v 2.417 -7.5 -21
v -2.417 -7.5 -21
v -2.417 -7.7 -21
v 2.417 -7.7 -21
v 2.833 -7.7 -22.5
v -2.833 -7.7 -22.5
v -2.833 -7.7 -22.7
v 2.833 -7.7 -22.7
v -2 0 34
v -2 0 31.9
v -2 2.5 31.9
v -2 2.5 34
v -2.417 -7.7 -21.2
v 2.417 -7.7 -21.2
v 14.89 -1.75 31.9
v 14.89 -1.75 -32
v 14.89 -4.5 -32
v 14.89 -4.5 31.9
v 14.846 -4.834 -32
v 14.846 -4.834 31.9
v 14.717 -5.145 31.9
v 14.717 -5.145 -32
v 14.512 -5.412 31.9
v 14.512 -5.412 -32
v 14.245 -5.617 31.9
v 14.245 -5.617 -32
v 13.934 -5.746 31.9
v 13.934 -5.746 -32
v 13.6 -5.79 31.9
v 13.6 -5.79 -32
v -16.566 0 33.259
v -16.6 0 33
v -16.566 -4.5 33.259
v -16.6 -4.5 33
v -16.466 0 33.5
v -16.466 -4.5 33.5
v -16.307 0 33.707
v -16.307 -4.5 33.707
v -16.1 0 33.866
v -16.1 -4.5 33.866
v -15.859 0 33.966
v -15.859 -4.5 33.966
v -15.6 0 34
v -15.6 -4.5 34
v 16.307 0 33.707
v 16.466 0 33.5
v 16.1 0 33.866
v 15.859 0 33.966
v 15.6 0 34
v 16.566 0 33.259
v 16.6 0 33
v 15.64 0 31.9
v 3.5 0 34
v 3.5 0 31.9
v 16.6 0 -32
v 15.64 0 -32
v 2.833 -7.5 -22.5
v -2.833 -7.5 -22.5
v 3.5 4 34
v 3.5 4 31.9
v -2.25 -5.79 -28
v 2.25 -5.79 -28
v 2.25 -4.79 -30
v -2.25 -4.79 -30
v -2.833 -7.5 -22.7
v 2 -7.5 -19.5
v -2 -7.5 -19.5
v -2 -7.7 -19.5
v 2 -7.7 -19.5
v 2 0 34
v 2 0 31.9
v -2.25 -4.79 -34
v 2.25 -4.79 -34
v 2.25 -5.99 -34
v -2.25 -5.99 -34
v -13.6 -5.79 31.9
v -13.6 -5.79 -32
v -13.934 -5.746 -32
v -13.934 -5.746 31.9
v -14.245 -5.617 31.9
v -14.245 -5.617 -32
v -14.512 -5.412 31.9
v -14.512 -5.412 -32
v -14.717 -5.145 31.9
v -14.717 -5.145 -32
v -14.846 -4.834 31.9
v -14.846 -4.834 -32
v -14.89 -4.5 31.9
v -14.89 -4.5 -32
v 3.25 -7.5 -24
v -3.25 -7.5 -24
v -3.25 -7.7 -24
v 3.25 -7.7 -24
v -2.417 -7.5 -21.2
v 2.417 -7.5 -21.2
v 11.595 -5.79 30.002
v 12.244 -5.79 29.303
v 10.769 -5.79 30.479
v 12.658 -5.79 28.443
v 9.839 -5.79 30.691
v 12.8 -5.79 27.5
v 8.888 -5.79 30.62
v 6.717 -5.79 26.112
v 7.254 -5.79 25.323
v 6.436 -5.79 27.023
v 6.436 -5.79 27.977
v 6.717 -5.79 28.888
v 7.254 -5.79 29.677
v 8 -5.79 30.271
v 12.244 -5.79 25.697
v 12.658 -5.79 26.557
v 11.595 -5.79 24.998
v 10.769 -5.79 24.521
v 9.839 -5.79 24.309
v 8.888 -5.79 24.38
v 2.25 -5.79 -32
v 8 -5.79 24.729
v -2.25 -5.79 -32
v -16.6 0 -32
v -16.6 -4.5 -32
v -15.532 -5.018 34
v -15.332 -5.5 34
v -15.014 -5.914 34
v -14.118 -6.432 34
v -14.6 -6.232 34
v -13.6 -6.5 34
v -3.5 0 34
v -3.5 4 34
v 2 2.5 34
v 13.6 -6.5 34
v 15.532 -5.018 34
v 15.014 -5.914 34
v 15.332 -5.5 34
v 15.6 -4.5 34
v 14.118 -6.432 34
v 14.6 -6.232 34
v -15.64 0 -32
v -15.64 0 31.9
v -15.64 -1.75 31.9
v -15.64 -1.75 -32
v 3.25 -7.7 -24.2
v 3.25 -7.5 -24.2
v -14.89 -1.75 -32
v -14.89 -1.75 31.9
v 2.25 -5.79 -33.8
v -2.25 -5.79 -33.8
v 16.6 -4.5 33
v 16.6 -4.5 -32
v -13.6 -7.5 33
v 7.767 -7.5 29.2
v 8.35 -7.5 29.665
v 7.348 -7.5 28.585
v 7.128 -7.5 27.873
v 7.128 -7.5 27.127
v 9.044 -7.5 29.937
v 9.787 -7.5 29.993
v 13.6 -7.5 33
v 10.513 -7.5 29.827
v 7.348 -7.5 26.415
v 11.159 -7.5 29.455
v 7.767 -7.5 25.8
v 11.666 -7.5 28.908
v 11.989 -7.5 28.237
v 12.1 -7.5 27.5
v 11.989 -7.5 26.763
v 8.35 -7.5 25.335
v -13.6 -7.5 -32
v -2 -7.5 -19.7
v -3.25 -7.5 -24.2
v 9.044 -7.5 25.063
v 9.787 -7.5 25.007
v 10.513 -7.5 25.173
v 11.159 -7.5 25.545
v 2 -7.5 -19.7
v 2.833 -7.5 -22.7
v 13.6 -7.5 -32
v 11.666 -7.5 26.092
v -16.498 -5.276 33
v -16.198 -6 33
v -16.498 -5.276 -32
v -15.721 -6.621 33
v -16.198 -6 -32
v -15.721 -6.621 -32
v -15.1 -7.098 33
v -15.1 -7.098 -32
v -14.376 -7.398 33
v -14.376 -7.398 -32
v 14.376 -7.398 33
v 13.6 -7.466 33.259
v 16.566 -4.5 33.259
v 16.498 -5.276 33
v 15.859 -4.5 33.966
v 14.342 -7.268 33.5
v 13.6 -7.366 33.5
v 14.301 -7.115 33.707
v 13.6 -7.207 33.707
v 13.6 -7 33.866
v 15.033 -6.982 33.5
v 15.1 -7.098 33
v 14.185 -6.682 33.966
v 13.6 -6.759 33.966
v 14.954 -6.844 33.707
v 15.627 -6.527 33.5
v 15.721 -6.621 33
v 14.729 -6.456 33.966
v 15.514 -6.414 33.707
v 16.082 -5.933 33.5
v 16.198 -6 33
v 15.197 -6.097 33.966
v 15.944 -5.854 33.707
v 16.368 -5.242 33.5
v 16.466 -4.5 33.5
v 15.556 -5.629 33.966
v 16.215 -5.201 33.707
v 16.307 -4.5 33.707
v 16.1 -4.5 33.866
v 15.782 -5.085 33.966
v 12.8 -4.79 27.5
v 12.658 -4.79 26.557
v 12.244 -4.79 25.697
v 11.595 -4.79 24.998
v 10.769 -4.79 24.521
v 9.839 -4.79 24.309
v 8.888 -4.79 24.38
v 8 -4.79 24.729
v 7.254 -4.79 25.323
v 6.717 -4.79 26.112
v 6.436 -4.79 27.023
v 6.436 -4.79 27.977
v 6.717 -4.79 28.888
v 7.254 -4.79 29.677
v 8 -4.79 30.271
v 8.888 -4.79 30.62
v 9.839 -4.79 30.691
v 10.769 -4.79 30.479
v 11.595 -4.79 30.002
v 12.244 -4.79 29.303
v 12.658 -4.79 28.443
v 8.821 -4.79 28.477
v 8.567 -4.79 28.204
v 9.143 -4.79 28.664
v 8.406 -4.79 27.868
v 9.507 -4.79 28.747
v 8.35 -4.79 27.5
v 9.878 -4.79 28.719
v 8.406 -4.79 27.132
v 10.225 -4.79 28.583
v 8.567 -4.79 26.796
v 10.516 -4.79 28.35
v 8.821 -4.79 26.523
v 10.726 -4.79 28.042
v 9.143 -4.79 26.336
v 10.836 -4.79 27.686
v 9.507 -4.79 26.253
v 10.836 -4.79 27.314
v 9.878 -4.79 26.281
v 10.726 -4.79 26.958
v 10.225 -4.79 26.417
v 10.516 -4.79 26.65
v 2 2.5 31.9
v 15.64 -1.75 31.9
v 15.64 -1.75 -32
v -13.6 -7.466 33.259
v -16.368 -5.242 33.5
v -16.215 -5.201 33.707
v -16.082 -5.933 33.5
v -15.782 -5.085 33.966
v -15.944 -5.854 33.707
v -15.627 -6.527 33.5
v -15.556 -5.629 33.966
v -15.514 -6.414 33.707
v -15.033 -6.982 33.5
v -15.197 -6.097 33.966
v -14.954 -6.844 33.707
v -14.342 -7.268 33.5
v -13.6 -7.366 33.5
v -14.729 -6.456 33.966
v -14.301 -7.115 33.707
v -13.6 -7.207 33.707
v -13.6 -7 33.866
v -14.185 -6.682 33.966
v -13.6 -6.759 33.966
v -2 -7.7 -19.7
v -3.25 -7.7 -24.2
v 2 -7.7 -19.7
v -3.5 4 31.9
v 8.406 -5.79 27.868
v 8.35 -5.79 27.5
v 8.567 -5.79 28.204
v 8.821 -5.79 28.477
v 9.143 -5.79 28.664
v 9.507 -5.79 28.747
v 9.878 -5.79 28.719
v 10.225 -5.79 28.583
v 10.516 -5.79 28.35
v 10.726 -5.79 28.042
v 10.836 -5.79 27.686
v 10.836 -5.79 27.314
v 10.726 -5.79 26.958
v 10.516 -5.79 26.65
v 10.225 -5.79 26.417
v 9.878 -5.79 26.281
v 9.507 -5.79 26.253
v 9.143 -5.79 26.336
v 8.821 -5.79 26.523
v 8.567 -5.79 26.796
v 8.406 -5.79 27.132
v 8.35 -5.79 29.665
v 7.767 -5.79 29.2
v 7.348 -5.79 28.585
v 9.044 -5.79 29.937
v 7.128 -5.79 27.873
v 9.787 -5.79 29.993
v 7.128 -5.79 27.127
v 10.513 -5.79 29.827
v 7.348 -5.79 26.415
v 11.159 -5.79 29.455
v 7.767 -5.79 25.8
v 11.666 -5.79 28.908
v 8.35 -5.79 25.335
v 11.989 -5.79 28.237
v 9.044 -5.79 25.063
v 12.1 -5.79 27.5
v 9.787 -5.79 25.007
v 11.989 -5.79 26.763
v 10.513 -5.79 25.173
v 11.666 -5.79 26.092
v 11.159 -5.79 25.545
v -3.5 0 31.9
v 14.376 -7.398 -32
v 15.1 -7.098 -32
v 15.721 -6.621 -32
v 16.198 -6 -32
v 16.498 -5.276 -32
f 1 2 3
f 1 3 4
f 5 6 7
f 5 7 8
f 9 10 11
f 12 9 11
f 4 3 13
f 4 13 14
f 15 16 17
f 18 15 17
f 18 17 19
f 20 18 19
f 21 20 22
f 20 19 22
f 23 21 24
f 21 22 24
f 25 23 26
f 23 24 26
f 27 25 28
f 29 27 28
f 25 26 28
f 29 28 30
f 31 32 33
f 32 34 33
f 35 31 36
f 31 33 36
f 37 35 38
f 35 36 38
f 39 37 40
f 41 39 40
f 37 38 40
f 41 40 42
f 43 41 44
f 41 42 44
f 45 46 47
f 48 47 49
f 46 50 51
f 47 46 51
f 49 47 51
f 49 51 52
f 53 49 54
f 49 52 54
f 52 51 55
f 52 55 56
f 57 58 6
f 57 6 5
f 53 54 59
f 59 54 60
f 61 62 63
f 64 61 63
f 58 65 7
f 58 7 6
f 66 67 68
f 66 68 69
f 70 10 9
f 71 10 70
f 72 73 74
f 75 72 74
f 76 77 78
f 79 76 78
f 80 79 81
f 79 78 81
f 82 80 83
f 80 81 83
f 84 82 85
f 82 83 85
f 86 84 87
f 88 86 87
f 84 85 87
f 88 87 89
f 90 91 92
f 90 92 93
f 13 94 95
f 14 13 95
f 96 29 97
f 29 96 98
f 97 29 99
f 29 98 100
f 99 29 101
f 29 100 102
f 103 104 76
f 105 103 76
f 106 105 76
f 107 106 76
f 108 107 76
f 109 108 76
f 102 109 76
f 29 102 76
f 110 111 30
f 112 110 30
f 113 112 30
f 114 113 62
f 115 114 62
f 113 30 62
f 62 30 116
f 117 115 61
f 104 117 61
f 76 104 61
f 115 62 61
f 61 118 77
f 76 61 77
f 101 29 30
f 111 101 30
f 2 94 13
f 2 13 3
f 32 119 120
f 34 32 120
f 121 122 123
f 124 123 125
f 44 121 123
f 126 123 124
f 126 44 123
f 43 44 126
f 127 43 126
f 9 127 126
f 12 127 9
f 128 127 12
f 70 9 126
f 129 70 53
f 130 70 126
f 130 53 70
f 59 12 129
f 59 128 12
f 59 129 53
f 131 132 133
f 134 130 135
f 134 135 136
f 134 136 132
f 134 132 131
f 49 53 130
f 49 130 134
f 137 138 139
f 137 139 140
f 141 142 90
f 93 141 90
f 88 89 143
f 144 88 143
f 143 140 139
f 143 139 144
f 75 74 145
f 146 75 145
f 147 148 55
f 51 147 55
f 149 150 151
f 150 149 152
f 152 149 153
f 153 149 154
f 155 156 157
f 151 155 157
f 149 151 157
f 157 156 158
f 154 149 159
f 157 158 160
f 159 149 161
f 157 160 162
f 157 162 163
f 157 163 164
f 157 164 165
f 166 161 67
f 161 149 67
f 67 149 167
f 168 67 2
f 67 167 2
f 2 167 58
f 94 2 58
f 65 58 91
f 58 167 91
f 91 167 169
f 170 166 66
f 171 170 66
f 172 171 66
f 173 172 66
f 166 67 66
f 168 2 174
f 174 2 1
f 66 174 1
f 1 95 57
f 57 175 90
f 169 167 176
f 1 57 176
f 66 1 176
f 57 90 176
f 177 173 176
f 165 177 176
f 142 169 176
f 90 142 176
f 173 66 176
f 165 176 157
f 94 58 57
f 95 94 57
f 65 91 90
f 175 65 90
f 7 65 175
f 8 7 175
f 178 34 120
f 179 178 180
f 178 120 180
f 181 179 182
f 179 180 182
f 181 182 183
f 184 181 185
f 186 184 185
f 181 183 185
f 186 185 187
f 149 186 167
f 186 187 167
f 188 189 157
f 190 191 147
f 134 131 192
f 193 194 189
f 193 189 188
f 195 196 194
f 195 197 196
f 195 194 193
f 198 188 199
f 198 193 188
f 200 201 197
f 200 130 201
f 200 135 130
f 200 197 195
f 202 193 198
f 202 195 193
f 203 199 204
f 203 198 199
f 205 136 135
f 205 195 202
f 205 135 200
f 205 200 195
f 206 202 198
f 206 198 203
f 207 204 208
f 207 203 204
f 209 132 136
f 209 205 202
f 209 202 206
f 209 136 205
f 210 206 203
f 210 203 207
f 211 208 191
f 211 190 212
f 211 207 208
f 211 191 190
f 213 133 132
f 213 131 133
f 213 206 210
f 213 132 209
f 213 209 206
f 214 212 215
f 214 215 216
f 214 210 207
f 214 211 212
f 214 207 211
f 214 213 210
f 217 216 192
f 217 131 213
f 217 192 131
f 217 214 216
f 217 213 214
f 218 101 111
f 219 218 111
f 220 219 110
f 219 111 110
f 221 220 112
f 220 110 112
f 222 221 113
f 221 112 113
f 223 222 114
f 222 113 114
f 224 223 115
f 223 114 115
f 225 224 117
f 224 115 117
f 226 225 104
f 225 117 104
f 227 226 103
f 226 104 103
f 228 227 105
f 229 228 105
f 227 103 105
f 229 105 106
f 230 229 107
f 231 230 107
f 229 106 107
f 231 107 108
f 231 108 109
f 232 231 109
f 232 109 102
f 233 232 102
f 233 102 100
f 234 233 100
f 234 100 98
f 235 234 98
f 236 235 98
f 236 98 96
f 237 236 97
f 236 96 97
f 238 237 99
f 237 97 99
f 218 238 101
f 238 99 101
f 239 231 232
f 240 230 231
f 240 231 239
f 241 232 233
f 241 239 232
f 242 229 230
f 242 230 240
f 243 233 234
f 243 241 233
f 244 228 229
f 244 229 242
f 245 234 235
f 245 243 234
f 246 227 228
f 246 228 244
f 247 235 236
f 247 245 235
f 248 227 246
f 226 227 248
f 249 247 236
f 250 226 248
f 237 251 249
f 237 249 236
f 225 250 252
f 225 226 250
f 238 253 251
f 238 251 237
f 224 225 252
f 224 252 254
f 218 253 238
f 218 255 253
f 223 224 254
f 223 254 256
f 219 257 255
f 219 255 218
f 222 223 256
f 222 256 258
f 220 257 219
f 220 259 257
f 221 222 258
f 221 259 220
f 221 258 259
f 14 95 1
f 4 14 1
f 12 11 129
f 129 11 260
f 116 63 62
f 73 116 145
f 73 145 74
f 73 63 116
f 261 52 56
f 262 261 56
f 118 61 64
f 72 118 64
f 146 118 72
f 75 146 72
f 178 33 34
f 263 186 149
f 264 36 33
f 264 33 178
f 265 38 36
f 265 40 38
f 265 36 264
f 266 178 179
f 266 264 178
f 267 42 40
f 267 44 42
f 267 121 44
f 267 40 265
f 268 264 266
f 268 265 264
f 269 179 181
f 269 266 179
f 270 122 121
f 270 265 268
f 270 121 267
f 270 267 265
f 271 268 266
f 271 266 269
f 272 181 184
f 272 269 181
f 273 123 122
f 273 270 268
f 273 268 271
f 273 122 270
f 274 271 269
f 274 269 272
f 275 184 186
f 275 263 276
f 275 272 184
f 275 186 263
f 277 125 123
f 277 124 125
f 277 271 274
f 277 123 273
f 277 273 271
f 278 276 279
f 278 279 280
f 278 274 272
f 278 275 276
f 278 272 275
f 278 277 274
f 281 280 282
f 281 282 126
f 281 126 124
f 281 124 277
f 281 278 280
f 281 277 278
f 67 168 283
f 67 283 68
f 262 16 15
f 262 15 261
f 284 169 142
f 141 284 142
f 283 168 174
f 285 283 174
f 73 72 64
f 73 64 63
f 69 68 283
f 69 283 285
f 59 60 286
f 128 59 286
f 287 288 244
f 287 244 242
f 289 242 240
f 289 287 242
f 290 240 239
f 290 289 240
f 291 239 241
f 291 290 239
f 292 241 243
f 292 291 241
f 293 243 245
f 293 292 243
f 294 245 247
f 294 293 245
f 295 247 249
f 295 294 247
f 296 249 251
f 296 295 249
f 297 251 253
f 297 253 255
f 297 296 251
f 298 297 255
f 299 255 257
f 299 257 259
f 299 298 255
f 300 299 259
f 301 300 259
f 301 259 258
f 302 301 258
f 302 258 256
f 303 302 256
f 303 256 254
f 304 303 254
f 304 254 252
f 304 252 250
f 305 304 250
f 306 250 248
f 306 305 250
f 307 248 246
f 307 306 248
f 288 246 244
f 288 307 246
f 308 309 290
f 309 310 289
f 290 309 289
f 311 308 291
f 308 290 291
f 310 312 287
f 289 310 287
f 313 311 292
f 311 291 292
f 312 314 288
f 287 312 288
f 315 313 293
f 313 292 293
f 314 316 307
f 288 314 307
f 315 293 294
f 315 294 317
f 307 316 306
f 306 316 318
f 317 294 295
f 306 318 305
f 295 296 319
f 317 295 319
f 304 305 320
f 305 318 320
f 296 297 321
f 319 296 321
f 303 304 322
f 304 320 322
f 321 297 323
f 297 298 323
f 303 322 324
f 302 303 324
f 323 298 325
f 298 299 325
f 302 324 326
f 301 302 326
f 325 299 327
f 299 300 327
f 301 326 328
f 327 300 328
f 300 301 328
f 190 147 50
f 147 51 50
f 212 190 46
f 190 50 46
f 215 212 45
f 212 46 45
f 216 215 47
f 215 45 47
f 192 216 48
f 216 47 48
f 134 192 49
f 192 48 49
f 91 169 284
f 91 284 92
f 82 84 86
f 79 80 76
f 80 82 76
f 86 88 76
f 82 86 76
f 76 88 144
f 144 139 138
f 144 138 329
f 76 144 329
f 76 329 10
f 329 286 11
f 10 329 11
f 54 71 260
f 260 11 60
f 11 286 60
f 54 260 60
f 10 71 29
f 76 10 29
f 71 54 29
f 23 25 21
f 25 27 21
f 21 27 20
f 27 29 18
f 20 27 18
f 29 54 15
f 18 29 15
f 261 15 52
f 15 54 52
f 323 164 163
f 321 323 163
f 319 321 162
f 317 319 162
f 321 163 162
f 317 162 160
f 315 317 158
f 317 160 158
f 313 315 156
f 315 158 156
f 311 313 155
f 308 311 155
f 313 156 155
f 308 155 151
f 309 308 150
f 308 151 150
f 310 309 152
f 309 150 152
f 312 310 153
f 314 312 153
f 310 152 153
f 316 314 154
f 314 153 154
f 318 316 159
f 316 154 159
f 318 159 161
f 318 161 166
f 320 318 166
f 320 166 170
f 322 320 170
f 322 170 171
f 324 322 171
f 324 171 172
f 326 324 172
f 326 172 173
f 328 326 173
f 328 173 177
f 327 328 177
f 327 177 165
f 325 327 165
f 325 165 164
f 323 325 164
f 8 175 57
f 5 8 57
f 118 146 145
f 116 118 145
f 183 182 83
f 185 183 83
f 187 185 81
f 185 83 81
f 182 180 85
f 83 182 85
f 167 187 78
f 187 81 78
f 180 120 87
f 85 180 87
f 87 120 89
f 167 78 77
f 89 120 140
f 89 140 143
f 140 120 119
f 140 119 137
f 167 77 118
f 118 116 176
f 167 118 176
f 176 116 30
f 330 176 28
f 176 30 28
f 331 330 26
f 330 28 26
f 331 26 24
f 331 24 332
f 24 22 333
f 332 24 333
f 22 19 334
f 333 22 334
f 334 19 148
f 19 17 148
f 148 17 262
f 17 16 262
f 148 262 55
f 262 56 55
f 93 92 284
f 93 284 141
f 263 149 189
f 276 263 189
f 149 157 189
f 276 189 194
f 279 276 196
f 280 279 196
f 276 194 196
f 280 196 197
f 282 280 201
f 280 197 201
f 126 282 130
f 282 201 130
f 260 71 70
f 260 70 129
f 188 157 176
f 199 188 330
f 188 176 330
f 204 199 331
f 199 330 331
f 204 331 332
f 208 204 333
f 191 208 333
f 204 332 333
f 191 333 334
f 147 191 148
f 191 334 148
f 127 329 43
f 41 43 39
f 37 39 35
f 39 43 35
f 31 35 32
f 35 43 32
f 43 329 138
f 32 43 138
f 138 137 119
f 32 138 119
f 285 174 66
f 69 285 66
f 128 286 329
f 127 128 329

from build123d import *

# Parameters (mm, degrees)
EXTRU_MINCE1_DEPTH             = 32
EXTRU_MINCE1_DEPTH_BACK        = 32
BOSS_EXTRU_1_DEPTH             = 2
BOSS_EXTRU_1_DEPTH_BACK        = 0.1
ESQUISSE2_W                    = 4
ESQUISSE2_H                    = 2.5
ESQUISSE3_W                    = 31.28
ESQUISSE3_H                    = 65.9
ENL_V_MAT_EXTRU_4_DEPTH        = 1.75
ESQUISSE4_W                    = 4.5
ESQUISSE4_H                    = 6
BOSS_EXTRU_2_DEPTH             = 1
BOSS_EXTRU_3_REACH             = 40.572
BOSS_EXTRU_3_DIRECTION_2_REACH = 40.572
ENL_V_MAT_EXTRU_5_REACH        = 41.593
ESQUISSE7_W                    = 6.5
ESQUISSE7_H                    = 0.2
ESQUISSE7_W_2                  = 5.666666666
ESQUISSE7_W_3                  = 4.833333334
ESQUISSE7_W_4                  = 4
EXTRU_MINCE2_DEPTH             = 0.2
ESQUISSE8_R                    = 2.5
ENL_V_MAT_EXTRU_6_DEPTH        = 40.545037615
ESQUISSE9_R                    = 3.2
ESQUISSE9_R_2                  = 1.25
BOSS_EXTRU_4_DEPTH             = 1
CONG_1_R                       = 1


with BuildPart() as part:
    # Esquisse1 → Extru.-Mince1 (new, two sides: drawn at the far end of the back side and taken through both)
    with BuildSketch(Plane.XY.offset(-EXTRU_MINCE1_DEPTH_BACK)):
        with BuildLine():
            Line((-16.6, 0), (-16.6, -4.5))
            ThreePointArc((-16.6, -4.5), (-15.721320344, -6.621320344), (-13.6, -7.5))
            Line((-13.6, -7.5), (13.6, -7.5))
            ThreePointArc((13.6, -7.5), (15.721320344, -6.621320344), (16.6, -4.5))
            Line((16.6, -4.5), (16.6, 0))
            Line((16.6, 0), (14.89, 0))
            Line((14.89, 0), (14.89, -4.5))
            ThreePointArc((14.89, -4.5), (14.512167748, -5.412167748), (13.6, -5.79))
            Line((13.6, -5.79), (-13.6, -5.79))
            ThreePointArc((-13.6, -5.79), (-14.512167748, -5.412167748), (-14.89, -4.5))
            Line((-14.89, -4.5), (-14.89, 0))
            Line((-14.89, 0), (-16.6, 0))
        make_face()
    extrude(amount=EXTRU_MINCE1_DEPTH + EXTRU_MINCE1_DEPTH_BACK)

    # Esquisse2 → Boss.-Extru.1 (add, two sides: drawn at the far end of the back side and taken through both)
    with BuildSketch(Plane.XY.offset(32).offset(-BOSS_EXTRU_1_DEPTH_BACK)):
        with BuildLine():
            Line((16.6, -4.5), (16.6, 0))
            Line((16.6, 0), (3.5, 0))
            Line((3.5, 0), (3.5, 4))
            Line((3.5, 4), (-3.5, 4))
            Line((-3.5, 4), (-3.5, 0))
            Line((-3.5, 0), (-16.6, 0))
            Line((-16.6, 0), (-16.6, -4.5))
            ThreePointArc((-16.6, -4.5), (-15.721320344, -6.621320344), (-13.6, -7.5))
            Line((-13.6, -7.5), (13.6, -7.5))
            ThreePointArc((13.6, -7.5), (15.721320344, -6.621320344), (16.6, -4.5))
        make_face()
        with Locations((0, 1.25)):
            Rectangle(ESQUISSE2_W, ESQUISSE2_H, mode=Mode.SUBTRACT)
    extrude(amount=BOSS_EXTRU_1_DEPTH + BOSS_EXTRU_1_DEPTH_BACK)

    # Esquisse3 → Enlèv. mat.-Extru.4 (cut)
    with BuildSketch(Plane(origin=(0, 0, 0), x_dir=(1, 0, 0), z_dir=(0, 1, 0))):
        with Locations((0, 1.05)):
            Rectangle(ESQUISSE3_W, ESQUISSE3_H)
    extrude(amount=-ENL_V_MAT_EXTRU_4_DEPTH, mode=Mode.SUBTRACT)

    # Esquisse4 → Boss.-Extru.2 (add)
    with BuildSketch(Plane(origin=(0, -5.79, 0), x_dir=(1, 0, 0), z_dir=(0, 1, 0))):
        with Locations((0, 31)):
            Rectangle(ESQUISSE4_W, ESQUISSE4_H)
    extrude(amount=BOSS_EXTRU_2_DEPTH)

    # Boss.-Extru.3: up to this face of the body (flat: up to its plane)
    boss_extru_3_end = Plane(part.part.faces().sort_by_distance((2.25, -5.29, -31))[0])
    # Esquisse5 → Boss.-Extru.3 (add, up to the picked face)
    with BuildSketch(Plane(origin=(0, 0, 0), x_dir=(0, 0, -1), z_dir=(1, 0, 0)), mode=Mode.PRIVATE) as boss_extru_3_sk1:
        Polygon((34, -5.79), (34, -5.99), (33.8, -5.79), align=None)
    boss_extru_3_tool1 = split(extrude(boss_extru_3_sk1.sketch, amount=BOSS_EXTRU_3_REACH, mode=Mode.PRIVATE), bisect_by=boss_extru_3_end, keep=Keep.BOTH, mode=Mode.PRIVATE)
    add(boss_extru_3_tool1.solids().sort_by(Axis((0, -5.856667, -33.933333), (1, 0, 0)))[0])

    # Boss.-Extru.3 direction 2: up to this face of the body (flat: up to its plane)
    boss_extru_3_direction_2_end = Plane(part.part.faces().sort_by_distance((-2.25, -5.29, -31))[0])
    # Esquisse5 → Boss.-Extru.3 direction 2 (add, up to the picked face)
    with BuildSketch(Plane(origin=(0, 0, 0), x_dir=(0, 0, -1), z_dir=(1, 0, 0)), mode=Mode.PRIVATE) as boss_extru_3_direction_2_sk1:
        Polygon((34, -5.79), (34, -5.99), (33.8, -5.79), align=None)
    boss_extru_3_direction_2_tool1 = split(extrude(boss_extru_3_direction_2_sk1.sketch, amount=-BOSS_EXTRU_3_DIRECTION_2_REACH, mode=Mode.PRIVATE), bisect_by=boss_extru_3_direction_2_end, keep=Keep.BOTH, mode=Mode.PRIVATE)
    add(boss_extru_3_direction_2_tool1.solids().sort_by(Axis((0, -5.856667, -33.933333), (-1, 0, 0)))[0])

    # Esquisse6 → Enlèv. mat.-Extru.5 (cut, up to next)
    with BuildSketch(Plane(origin=(2.25, 0, 0), x_dir=(0, 0, -1), z_dir=(1, 0, 0)), mode=Mode.PRIVATE) as enl_v_mat_extru_5_sk1:
        Polygon((28, -5.79), (30, -4.79), (28, -4.79), align=None)
    enl_v_mat_extru_5_tool1 = extrude(enl_v_mat_extru_5_sk1.sketch, amount=-ENL_V_MAT_EXTRU_5_REACH, mode=Mode.PRIVATE) & part.part
    add(enl_v_mat_extru_5_tool1.solids().sort_by_distance((2.25, -5.123333, -28.666667))[0], mode=Mode.SUBTRACT)

    # Esquisse7 → Extru.-Mince2 (add)
    with BuildSketch(Plane.XZ.offset(7.5)):
        with Locations((0, -24.1)):
            Rectangle(ESQUISSE7_W, ESQUISSE7_H)
        with Locations((0, -22.6)):
            Rectangle(ESQUISSE7_W_2, ESQUISSE7_H)
        with Locations((0, -21.1)):
            Rectangle(ESQUISSE7_W_3, ESQUISSE7_H)
        with Locations((0, -19.6)):
            Rectangle(ESQUISSE7_W_4, ESQUISSE7_H)
    extrude(amount=EXTRU_MINCE2_DEPTH)

    # Esquisse8 → Enlèv. mat.-Extru.6 (cut, through all)
    with BuildSketch(Plane.XZ.offset(7.5)):
        with Locations((9.6, 27.5)):
            Circle(ESQUISSE8_R)
    extrude(amount=-ENL_V_MAT_EXTRU_6_DEPTH, mode=Mode.SUBTRACT)

    # Esquisse9 → Boss.-Extru.4 (add)
    with BuildSketch(Plane(origin=(0, -5.79, 0), x_dir=(1, 0, 0), z_dir=(0, 1, 0))):
        with Locations((9.6, -27.5)):
            Circle(ESQUISSE9_R)
        with Locations(Location((9.6, -27.5, 0), (0, 0, 180))):
            Circle(ESQUISSE9_R_2, mode=Mode.SUBTRACT)
    extrude(amount=BOSS_EXTRU_4_DEPTH)

    # Congé1
    cong_1_edges = [part.edges().sort_by_distance(p)[0] for p in [
        (15.721320344, -6.621320344, 34),
        (16.6, -2.25, 34),
        (-16.6, -2.25, 34),
        (-15.721320344, -6.621320344, 34),
        (0, -7.5, 34),
    ]]
    fillet(cong_1_edges, radius=CONG_1_R)


solid = part.part
